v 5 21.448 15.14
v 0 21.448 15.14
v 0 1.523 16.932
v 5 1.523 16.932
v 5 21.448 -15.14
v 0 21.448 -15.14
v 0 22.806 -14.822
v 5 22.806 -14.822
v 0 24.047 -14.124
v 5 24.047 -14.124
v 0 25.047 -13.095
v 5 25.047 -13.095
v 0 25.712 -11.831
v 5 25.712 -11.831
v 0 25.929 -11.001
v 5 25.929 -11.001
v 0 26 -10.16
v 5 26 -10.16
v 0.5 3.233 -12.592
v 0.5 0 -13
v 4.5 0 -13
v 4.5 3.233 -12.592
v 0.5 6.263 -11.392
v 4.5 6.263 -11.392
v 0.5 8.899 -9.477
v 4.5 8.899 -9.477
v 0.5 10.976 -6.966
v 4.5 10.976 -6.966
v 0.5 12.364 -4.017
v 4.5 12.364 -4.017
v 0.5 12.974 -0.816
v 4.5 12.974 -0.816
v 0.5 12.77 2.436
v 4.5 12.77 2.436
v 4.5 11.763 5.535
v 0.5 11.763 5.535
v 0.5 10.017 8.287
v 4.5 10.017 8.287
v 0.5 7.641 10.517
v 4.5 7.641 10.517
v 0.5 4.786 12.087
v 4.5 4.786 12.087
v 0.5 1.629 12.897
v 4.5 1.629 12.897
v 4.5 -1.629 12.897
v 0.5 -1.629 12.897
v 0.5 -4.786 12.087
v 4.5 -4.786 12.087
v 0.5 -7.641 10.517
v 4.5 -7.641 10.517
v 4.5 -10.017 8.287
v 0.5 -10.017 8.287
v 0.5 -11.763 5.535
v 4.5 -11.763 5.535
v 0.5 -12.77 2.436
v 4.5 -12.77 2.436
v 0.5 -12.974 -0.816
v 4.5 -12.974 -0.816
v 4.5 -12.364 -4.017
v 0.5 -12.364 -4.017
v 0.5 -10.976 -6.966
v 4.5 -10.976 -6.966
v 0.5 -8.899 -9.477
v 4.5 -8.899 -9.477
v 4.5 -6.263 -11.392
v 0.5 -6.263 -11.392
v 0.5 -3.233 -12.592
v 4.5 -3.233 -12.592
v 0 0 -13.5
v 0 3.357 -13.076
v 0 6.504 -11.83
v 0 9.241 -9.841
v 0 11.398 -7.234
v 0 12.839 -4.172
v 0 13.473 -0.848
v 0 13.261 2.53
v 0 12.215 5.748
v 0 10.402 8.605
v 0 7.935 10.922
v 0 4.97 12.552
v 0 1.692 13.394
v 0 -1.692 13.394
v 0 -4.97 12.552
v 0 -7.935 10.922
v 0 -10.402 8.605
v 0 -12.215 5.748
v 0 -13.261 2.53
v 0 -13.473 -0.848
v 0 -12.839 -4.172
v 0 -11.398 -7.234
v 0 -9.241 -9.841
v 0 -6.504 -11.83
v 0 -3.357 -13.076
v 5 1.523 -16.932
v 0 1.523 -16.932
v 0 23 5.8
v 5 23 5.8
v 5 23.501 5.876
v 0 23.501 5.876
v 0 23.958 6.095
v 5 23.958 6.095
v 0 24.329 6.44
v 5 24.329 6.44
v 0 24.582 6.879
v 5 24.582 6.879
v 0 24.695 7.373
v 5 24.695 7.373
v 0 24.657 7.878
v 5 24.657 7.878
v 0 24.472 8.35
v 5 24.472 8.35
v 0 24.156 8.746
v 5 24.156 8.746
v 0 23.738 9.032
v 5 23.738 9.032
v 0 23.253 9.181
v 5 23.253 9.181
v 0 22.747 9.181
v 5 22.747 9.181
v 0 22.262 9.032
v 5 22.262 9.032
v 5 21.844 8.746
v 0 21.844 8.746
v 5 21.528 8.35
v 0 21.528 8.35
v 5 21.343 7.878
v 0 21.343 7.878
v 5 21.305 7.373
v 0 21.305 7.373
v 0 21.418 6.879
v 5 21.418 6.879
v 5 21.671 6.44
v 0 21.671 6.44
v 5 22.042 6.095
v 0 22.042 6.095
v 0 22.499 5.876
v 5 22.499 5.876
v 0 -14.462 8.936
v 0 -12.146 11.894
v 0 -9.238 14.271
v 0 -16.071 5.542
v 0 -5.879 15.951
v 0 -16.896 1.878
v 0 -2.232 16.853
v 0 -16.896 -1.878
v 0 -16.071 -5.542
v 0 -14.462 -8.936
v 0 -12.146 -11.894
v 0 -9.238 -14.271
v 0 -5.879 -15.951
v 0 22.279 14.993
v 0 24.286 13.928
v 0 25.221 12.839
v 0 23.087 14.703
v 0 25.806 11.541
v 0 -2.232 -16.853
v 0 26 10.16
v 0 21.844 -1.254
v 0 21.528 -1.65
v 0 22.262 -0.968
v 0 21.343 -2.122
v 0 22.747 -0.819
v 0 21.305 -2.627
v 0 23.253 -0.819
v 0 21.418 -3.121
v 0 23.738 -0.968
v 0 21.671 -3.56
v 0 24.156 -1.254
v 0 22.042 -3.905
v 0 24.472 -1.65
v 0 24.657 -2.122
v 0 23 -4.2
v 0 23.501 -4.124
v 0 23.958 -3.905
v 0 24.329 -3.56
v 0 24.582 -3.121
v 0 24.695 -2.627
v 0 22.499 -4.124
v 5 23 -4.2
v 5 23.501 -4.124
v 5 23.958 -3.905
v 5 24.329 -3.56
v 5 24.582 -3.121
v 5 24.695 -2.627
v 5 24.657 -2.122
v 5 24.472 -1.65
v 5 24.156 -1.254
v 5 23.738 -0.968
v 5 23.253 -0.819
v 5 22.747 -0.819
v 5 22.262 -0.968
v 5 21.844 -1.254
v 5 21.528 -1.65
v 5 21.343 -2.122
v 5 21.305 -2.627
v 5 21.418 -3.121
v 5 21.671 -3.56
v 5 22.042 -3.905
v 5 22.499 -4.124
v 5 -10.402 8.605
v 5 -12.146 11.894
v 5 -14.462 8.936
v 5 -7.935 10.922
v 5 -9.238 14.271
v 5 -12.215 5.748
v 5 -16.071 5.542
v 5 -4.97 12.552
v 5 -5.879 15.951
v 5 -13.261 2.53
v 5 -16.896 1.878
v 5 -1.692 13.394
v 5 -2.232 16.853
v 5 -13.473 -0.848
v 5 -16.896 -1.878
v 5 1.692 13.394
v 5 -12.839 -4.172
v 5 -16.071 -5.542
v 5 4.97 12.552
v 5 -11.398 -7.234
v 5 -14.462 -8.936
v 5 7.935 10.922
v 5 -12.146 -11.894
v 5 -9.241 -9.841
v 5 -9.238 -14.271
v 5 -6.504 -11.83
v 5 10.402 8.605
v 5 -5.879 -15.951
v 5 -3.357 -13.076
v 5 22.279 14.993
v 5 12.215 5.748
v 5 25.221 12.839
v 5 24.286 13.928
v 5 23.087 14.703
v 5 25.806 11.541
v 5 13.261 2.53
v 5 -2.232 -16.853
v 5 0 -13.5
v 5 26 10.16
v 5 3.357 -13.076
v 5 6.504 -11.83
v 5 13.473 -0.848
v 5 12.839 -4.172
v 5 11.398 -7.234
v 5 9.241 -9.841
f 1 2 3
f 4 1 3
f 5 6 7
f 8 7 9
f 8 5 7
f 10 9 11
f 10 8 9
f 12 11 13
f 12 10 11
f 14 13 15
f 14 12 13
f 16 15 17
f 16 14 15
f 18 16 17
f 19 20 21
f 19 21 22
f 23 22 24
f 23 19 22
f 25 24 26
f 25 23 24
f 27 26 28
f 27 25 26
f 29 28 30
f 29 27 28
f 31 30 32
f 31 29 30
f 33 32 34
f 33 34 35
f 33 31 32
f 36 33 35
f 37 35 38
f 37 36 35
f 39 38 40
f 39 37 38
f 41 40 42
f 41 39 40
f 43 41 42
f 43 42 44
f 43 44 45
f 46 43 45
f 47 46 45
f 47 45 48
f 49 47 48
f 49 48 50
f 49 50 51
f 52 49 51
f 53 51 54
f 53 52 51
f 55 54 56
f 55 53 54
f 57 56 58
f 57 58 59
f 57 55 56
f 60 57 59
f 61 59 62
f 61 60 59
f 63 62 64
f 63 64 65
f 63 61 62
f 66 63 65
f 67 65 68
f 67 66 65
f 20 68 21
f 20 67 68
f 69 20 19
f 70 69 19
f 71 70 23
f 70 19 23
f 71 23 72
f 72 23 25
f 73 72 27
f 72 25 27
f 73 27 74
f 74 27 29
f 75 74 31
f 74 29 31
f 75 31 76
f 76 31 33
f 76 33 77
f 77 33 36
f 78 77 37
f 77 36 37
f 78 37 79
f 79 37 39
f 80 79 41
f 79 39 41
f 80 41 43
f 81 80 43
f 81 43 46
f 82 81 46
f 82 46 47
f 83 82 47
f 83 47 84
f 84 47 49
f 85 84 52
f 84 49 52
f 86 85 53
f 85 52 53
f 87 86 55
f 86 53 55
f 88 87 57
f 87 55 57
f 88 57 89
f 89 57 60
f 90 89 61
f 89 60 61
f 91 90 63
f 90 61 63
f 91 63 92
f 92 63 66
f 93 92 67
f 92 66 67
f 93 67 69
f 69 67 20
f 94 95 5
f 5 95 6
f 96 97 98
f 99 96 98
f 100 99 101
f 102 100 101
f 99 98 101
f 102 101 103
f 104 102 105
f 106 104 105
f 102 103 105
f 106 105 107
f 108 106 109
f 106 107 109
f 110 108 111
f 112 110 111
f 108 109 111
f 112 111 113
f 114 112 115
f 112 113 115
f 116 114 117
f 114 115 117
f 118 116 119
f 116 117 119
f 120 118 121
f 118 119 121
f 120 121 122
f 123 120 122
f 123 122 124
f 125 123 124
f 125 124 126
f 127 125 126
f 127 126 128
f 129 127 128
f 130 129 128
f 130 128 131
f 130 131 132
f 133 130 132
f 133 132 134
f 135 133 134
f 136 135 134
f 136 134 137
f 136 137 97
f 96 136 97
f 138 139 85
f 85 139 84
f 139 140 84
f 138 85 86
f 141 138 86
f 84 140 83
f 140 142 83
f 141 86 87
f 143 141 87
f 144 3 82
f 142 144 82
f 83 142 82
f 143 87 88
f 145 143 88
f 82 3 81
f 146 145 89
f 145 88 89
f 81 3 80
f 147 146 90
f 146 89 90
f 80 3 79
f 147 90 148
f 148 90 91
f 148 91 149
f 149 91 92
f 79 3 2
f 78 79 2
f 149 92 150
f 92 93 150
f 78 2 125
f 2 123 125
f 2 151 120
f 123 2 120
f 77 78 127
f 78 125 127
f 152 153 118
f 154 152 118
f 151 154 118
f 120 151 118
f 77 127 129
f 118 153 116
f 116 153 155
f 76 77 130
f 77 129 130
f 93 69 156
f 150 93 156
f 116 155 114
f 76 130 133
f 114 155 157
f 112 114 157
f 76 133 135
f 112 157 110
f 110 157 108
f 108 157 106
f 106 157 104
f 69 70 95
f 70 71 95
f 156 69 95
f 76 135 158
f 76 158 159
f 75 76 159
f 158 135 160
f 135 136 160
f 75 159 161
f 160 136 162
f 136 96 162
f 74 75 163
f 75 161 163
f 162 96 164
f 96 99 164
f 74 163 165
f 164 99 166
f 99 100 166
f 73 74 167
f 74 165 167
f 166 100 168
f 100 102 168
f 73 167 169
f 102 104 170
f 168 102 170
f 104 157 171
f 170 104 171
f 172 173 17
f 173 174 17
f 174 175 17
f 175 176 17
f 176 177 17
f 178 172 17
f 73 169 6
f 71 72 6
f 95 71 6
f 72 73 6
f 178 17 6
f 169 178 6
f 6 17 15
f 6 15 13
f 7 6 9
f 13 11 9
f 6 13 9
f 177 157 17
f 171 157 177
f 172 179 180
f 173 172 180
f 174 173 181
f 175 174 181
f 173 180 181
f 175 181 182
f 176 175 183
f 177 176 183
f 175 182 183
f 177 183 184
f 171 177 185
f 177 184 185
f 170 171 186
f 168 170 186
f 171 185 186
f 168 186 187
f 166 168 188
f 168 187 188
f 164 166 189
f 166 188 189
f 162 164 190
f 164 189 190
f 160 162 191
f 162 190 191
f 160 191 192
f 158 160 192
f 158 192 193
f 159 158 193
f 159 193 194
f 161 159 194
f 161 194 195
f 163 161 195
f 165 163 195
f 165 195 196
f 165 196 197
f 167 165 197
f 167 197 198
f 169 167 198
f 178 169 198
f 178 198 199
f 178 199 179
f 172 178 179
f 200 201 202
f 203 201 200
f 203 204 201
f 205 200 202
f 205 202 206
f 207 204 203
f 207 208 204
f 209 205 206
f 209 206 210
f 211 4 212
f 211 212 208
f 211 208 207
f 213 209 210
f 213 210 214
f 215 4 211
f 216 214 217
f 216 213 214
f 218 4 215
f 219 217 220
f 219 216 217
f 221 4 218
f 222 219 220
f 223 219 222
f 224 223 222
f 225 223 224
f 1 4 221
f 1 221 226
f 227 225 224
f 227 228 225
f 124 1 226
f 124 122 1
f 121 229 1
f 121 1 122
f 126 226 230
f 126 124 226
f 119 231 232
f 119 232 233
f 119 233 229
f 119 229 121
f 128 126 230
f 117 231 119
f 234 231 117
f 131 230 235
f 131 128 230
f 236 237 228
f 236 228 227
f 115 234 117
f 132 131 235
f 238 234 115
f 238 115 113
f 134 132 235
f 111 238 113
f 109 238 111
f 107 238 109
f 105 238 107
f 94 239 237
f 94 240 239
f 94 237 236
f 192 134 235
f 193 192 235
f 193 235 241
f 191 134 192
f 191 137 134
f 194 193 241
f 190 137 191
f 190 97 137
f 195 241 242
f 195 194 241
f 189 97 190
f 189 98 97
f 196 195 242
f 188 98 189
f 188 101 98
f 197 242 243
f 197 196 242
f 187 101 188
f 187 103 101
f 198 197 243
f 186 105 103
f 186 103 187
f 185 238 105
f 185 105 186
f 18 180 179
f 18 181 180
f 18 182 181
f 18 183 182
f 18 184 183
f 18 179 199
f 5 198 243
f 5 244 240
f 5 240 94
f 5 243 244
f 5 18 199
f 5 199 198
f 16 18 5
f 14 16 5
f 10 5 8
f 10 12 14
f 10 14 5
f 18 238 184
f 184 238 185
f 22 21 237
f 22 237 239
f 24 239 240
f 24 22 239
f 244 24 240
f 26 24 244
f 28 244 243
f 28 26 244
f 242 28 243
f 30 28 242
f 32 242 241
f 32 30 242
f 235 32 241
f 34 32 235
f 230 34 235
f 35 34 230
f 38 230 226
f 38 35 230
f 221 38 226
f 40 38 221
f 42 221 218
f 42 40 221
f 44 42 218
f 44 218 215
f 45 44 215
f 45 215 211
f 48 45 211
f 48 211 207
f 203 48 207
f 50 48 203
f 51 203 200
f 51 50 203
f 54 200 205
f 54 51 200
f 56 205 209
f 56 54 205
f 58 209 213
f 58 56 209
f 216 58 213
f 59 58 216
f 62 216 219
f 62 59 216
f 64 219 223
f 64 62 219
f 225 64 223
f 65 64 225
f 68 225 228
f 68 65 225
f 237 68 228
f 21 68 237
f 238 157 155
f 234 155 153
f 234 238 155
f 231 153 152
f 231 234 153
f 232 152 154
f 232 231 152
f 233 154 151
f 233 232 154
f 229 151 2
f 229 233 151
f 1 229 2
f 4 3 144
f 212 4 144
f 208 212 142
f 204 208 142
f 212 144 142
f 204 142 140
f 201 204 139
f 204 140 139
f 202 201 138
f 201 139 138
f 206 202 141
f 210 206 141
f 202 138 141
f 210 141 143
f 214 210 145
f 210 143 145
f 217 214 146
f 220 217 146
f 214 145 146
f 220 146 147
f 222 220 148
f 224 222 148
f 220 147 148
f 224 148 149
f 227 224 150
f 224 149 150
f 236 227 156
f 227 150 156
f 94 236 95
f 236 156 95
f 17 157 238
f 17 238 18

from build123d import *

# Parameters (mm, degrees)
SKETCH_1_R         = 17
SKETCH_1_R_2       = 13
SKETCH_1_W         = 30
SKETCH_1_H         = 3
EXTRUDE_1_DEPTH    = 5
FILLET_1_R         = 5
HOLE_WIZARD_M3_1_D = 3.4
CHAMFER1_SIZE      = 0.5


with BuildPart() as part:
    # 草图1 → 凸台-拉伸1 (new body)
    with BuildSketch(Plane(origin=(0, 0, 0), x_dir=(0, 0, -1), z_dir=(1, 0, 0))):
        Circle(SKETCH_1_R)
        Circle(SKETCH_1_R_2, mode=Mode.SUBTRACT)
        with BuildLine():
            Line((15, 23), (-15, 23))
            Line((-15, 23), (-16.931656145, 1.522832949))
            ThreePointArc((-16.931656145, 1.522832949), (0, 17), (16.931656145, 1.522832949))
            Line((16.931656145, 1.522832949), (15, 23))
        make_face()
        with Locations((0, 24.5)):
            Rectangle(SKETCH_1_W, SKETCH_1_H)
    extrude(amount=EXTRUDE_1_DEPTH)

    # 圆角1
    fillet_1_edges = [part.edges().sort_by_distance(p)[0] for p in [
        (2.5, 26, 15),
        (2.5, 26, -15),
    ]]
    fillet(fillet_1_edges, radius=FILLET_1_R)

    # M3 间隙孔1 (through all)
    with Locations(Plane.ZY):
        with Locations((-2.5, 23), (7.5, 23)):
            Hole(HOLE_WIZARD_M3_1_D / 2)

    # Chamfer1
    chamfer1_edges = [part.edges().sort_by_distance(p)[0] for p in [
        (0, 0, 13),
        (5, 0, 13),
    ]]
    chamfer(chamfer1_edges, length=CHAMFER1_SIZE)


solid = part.part
